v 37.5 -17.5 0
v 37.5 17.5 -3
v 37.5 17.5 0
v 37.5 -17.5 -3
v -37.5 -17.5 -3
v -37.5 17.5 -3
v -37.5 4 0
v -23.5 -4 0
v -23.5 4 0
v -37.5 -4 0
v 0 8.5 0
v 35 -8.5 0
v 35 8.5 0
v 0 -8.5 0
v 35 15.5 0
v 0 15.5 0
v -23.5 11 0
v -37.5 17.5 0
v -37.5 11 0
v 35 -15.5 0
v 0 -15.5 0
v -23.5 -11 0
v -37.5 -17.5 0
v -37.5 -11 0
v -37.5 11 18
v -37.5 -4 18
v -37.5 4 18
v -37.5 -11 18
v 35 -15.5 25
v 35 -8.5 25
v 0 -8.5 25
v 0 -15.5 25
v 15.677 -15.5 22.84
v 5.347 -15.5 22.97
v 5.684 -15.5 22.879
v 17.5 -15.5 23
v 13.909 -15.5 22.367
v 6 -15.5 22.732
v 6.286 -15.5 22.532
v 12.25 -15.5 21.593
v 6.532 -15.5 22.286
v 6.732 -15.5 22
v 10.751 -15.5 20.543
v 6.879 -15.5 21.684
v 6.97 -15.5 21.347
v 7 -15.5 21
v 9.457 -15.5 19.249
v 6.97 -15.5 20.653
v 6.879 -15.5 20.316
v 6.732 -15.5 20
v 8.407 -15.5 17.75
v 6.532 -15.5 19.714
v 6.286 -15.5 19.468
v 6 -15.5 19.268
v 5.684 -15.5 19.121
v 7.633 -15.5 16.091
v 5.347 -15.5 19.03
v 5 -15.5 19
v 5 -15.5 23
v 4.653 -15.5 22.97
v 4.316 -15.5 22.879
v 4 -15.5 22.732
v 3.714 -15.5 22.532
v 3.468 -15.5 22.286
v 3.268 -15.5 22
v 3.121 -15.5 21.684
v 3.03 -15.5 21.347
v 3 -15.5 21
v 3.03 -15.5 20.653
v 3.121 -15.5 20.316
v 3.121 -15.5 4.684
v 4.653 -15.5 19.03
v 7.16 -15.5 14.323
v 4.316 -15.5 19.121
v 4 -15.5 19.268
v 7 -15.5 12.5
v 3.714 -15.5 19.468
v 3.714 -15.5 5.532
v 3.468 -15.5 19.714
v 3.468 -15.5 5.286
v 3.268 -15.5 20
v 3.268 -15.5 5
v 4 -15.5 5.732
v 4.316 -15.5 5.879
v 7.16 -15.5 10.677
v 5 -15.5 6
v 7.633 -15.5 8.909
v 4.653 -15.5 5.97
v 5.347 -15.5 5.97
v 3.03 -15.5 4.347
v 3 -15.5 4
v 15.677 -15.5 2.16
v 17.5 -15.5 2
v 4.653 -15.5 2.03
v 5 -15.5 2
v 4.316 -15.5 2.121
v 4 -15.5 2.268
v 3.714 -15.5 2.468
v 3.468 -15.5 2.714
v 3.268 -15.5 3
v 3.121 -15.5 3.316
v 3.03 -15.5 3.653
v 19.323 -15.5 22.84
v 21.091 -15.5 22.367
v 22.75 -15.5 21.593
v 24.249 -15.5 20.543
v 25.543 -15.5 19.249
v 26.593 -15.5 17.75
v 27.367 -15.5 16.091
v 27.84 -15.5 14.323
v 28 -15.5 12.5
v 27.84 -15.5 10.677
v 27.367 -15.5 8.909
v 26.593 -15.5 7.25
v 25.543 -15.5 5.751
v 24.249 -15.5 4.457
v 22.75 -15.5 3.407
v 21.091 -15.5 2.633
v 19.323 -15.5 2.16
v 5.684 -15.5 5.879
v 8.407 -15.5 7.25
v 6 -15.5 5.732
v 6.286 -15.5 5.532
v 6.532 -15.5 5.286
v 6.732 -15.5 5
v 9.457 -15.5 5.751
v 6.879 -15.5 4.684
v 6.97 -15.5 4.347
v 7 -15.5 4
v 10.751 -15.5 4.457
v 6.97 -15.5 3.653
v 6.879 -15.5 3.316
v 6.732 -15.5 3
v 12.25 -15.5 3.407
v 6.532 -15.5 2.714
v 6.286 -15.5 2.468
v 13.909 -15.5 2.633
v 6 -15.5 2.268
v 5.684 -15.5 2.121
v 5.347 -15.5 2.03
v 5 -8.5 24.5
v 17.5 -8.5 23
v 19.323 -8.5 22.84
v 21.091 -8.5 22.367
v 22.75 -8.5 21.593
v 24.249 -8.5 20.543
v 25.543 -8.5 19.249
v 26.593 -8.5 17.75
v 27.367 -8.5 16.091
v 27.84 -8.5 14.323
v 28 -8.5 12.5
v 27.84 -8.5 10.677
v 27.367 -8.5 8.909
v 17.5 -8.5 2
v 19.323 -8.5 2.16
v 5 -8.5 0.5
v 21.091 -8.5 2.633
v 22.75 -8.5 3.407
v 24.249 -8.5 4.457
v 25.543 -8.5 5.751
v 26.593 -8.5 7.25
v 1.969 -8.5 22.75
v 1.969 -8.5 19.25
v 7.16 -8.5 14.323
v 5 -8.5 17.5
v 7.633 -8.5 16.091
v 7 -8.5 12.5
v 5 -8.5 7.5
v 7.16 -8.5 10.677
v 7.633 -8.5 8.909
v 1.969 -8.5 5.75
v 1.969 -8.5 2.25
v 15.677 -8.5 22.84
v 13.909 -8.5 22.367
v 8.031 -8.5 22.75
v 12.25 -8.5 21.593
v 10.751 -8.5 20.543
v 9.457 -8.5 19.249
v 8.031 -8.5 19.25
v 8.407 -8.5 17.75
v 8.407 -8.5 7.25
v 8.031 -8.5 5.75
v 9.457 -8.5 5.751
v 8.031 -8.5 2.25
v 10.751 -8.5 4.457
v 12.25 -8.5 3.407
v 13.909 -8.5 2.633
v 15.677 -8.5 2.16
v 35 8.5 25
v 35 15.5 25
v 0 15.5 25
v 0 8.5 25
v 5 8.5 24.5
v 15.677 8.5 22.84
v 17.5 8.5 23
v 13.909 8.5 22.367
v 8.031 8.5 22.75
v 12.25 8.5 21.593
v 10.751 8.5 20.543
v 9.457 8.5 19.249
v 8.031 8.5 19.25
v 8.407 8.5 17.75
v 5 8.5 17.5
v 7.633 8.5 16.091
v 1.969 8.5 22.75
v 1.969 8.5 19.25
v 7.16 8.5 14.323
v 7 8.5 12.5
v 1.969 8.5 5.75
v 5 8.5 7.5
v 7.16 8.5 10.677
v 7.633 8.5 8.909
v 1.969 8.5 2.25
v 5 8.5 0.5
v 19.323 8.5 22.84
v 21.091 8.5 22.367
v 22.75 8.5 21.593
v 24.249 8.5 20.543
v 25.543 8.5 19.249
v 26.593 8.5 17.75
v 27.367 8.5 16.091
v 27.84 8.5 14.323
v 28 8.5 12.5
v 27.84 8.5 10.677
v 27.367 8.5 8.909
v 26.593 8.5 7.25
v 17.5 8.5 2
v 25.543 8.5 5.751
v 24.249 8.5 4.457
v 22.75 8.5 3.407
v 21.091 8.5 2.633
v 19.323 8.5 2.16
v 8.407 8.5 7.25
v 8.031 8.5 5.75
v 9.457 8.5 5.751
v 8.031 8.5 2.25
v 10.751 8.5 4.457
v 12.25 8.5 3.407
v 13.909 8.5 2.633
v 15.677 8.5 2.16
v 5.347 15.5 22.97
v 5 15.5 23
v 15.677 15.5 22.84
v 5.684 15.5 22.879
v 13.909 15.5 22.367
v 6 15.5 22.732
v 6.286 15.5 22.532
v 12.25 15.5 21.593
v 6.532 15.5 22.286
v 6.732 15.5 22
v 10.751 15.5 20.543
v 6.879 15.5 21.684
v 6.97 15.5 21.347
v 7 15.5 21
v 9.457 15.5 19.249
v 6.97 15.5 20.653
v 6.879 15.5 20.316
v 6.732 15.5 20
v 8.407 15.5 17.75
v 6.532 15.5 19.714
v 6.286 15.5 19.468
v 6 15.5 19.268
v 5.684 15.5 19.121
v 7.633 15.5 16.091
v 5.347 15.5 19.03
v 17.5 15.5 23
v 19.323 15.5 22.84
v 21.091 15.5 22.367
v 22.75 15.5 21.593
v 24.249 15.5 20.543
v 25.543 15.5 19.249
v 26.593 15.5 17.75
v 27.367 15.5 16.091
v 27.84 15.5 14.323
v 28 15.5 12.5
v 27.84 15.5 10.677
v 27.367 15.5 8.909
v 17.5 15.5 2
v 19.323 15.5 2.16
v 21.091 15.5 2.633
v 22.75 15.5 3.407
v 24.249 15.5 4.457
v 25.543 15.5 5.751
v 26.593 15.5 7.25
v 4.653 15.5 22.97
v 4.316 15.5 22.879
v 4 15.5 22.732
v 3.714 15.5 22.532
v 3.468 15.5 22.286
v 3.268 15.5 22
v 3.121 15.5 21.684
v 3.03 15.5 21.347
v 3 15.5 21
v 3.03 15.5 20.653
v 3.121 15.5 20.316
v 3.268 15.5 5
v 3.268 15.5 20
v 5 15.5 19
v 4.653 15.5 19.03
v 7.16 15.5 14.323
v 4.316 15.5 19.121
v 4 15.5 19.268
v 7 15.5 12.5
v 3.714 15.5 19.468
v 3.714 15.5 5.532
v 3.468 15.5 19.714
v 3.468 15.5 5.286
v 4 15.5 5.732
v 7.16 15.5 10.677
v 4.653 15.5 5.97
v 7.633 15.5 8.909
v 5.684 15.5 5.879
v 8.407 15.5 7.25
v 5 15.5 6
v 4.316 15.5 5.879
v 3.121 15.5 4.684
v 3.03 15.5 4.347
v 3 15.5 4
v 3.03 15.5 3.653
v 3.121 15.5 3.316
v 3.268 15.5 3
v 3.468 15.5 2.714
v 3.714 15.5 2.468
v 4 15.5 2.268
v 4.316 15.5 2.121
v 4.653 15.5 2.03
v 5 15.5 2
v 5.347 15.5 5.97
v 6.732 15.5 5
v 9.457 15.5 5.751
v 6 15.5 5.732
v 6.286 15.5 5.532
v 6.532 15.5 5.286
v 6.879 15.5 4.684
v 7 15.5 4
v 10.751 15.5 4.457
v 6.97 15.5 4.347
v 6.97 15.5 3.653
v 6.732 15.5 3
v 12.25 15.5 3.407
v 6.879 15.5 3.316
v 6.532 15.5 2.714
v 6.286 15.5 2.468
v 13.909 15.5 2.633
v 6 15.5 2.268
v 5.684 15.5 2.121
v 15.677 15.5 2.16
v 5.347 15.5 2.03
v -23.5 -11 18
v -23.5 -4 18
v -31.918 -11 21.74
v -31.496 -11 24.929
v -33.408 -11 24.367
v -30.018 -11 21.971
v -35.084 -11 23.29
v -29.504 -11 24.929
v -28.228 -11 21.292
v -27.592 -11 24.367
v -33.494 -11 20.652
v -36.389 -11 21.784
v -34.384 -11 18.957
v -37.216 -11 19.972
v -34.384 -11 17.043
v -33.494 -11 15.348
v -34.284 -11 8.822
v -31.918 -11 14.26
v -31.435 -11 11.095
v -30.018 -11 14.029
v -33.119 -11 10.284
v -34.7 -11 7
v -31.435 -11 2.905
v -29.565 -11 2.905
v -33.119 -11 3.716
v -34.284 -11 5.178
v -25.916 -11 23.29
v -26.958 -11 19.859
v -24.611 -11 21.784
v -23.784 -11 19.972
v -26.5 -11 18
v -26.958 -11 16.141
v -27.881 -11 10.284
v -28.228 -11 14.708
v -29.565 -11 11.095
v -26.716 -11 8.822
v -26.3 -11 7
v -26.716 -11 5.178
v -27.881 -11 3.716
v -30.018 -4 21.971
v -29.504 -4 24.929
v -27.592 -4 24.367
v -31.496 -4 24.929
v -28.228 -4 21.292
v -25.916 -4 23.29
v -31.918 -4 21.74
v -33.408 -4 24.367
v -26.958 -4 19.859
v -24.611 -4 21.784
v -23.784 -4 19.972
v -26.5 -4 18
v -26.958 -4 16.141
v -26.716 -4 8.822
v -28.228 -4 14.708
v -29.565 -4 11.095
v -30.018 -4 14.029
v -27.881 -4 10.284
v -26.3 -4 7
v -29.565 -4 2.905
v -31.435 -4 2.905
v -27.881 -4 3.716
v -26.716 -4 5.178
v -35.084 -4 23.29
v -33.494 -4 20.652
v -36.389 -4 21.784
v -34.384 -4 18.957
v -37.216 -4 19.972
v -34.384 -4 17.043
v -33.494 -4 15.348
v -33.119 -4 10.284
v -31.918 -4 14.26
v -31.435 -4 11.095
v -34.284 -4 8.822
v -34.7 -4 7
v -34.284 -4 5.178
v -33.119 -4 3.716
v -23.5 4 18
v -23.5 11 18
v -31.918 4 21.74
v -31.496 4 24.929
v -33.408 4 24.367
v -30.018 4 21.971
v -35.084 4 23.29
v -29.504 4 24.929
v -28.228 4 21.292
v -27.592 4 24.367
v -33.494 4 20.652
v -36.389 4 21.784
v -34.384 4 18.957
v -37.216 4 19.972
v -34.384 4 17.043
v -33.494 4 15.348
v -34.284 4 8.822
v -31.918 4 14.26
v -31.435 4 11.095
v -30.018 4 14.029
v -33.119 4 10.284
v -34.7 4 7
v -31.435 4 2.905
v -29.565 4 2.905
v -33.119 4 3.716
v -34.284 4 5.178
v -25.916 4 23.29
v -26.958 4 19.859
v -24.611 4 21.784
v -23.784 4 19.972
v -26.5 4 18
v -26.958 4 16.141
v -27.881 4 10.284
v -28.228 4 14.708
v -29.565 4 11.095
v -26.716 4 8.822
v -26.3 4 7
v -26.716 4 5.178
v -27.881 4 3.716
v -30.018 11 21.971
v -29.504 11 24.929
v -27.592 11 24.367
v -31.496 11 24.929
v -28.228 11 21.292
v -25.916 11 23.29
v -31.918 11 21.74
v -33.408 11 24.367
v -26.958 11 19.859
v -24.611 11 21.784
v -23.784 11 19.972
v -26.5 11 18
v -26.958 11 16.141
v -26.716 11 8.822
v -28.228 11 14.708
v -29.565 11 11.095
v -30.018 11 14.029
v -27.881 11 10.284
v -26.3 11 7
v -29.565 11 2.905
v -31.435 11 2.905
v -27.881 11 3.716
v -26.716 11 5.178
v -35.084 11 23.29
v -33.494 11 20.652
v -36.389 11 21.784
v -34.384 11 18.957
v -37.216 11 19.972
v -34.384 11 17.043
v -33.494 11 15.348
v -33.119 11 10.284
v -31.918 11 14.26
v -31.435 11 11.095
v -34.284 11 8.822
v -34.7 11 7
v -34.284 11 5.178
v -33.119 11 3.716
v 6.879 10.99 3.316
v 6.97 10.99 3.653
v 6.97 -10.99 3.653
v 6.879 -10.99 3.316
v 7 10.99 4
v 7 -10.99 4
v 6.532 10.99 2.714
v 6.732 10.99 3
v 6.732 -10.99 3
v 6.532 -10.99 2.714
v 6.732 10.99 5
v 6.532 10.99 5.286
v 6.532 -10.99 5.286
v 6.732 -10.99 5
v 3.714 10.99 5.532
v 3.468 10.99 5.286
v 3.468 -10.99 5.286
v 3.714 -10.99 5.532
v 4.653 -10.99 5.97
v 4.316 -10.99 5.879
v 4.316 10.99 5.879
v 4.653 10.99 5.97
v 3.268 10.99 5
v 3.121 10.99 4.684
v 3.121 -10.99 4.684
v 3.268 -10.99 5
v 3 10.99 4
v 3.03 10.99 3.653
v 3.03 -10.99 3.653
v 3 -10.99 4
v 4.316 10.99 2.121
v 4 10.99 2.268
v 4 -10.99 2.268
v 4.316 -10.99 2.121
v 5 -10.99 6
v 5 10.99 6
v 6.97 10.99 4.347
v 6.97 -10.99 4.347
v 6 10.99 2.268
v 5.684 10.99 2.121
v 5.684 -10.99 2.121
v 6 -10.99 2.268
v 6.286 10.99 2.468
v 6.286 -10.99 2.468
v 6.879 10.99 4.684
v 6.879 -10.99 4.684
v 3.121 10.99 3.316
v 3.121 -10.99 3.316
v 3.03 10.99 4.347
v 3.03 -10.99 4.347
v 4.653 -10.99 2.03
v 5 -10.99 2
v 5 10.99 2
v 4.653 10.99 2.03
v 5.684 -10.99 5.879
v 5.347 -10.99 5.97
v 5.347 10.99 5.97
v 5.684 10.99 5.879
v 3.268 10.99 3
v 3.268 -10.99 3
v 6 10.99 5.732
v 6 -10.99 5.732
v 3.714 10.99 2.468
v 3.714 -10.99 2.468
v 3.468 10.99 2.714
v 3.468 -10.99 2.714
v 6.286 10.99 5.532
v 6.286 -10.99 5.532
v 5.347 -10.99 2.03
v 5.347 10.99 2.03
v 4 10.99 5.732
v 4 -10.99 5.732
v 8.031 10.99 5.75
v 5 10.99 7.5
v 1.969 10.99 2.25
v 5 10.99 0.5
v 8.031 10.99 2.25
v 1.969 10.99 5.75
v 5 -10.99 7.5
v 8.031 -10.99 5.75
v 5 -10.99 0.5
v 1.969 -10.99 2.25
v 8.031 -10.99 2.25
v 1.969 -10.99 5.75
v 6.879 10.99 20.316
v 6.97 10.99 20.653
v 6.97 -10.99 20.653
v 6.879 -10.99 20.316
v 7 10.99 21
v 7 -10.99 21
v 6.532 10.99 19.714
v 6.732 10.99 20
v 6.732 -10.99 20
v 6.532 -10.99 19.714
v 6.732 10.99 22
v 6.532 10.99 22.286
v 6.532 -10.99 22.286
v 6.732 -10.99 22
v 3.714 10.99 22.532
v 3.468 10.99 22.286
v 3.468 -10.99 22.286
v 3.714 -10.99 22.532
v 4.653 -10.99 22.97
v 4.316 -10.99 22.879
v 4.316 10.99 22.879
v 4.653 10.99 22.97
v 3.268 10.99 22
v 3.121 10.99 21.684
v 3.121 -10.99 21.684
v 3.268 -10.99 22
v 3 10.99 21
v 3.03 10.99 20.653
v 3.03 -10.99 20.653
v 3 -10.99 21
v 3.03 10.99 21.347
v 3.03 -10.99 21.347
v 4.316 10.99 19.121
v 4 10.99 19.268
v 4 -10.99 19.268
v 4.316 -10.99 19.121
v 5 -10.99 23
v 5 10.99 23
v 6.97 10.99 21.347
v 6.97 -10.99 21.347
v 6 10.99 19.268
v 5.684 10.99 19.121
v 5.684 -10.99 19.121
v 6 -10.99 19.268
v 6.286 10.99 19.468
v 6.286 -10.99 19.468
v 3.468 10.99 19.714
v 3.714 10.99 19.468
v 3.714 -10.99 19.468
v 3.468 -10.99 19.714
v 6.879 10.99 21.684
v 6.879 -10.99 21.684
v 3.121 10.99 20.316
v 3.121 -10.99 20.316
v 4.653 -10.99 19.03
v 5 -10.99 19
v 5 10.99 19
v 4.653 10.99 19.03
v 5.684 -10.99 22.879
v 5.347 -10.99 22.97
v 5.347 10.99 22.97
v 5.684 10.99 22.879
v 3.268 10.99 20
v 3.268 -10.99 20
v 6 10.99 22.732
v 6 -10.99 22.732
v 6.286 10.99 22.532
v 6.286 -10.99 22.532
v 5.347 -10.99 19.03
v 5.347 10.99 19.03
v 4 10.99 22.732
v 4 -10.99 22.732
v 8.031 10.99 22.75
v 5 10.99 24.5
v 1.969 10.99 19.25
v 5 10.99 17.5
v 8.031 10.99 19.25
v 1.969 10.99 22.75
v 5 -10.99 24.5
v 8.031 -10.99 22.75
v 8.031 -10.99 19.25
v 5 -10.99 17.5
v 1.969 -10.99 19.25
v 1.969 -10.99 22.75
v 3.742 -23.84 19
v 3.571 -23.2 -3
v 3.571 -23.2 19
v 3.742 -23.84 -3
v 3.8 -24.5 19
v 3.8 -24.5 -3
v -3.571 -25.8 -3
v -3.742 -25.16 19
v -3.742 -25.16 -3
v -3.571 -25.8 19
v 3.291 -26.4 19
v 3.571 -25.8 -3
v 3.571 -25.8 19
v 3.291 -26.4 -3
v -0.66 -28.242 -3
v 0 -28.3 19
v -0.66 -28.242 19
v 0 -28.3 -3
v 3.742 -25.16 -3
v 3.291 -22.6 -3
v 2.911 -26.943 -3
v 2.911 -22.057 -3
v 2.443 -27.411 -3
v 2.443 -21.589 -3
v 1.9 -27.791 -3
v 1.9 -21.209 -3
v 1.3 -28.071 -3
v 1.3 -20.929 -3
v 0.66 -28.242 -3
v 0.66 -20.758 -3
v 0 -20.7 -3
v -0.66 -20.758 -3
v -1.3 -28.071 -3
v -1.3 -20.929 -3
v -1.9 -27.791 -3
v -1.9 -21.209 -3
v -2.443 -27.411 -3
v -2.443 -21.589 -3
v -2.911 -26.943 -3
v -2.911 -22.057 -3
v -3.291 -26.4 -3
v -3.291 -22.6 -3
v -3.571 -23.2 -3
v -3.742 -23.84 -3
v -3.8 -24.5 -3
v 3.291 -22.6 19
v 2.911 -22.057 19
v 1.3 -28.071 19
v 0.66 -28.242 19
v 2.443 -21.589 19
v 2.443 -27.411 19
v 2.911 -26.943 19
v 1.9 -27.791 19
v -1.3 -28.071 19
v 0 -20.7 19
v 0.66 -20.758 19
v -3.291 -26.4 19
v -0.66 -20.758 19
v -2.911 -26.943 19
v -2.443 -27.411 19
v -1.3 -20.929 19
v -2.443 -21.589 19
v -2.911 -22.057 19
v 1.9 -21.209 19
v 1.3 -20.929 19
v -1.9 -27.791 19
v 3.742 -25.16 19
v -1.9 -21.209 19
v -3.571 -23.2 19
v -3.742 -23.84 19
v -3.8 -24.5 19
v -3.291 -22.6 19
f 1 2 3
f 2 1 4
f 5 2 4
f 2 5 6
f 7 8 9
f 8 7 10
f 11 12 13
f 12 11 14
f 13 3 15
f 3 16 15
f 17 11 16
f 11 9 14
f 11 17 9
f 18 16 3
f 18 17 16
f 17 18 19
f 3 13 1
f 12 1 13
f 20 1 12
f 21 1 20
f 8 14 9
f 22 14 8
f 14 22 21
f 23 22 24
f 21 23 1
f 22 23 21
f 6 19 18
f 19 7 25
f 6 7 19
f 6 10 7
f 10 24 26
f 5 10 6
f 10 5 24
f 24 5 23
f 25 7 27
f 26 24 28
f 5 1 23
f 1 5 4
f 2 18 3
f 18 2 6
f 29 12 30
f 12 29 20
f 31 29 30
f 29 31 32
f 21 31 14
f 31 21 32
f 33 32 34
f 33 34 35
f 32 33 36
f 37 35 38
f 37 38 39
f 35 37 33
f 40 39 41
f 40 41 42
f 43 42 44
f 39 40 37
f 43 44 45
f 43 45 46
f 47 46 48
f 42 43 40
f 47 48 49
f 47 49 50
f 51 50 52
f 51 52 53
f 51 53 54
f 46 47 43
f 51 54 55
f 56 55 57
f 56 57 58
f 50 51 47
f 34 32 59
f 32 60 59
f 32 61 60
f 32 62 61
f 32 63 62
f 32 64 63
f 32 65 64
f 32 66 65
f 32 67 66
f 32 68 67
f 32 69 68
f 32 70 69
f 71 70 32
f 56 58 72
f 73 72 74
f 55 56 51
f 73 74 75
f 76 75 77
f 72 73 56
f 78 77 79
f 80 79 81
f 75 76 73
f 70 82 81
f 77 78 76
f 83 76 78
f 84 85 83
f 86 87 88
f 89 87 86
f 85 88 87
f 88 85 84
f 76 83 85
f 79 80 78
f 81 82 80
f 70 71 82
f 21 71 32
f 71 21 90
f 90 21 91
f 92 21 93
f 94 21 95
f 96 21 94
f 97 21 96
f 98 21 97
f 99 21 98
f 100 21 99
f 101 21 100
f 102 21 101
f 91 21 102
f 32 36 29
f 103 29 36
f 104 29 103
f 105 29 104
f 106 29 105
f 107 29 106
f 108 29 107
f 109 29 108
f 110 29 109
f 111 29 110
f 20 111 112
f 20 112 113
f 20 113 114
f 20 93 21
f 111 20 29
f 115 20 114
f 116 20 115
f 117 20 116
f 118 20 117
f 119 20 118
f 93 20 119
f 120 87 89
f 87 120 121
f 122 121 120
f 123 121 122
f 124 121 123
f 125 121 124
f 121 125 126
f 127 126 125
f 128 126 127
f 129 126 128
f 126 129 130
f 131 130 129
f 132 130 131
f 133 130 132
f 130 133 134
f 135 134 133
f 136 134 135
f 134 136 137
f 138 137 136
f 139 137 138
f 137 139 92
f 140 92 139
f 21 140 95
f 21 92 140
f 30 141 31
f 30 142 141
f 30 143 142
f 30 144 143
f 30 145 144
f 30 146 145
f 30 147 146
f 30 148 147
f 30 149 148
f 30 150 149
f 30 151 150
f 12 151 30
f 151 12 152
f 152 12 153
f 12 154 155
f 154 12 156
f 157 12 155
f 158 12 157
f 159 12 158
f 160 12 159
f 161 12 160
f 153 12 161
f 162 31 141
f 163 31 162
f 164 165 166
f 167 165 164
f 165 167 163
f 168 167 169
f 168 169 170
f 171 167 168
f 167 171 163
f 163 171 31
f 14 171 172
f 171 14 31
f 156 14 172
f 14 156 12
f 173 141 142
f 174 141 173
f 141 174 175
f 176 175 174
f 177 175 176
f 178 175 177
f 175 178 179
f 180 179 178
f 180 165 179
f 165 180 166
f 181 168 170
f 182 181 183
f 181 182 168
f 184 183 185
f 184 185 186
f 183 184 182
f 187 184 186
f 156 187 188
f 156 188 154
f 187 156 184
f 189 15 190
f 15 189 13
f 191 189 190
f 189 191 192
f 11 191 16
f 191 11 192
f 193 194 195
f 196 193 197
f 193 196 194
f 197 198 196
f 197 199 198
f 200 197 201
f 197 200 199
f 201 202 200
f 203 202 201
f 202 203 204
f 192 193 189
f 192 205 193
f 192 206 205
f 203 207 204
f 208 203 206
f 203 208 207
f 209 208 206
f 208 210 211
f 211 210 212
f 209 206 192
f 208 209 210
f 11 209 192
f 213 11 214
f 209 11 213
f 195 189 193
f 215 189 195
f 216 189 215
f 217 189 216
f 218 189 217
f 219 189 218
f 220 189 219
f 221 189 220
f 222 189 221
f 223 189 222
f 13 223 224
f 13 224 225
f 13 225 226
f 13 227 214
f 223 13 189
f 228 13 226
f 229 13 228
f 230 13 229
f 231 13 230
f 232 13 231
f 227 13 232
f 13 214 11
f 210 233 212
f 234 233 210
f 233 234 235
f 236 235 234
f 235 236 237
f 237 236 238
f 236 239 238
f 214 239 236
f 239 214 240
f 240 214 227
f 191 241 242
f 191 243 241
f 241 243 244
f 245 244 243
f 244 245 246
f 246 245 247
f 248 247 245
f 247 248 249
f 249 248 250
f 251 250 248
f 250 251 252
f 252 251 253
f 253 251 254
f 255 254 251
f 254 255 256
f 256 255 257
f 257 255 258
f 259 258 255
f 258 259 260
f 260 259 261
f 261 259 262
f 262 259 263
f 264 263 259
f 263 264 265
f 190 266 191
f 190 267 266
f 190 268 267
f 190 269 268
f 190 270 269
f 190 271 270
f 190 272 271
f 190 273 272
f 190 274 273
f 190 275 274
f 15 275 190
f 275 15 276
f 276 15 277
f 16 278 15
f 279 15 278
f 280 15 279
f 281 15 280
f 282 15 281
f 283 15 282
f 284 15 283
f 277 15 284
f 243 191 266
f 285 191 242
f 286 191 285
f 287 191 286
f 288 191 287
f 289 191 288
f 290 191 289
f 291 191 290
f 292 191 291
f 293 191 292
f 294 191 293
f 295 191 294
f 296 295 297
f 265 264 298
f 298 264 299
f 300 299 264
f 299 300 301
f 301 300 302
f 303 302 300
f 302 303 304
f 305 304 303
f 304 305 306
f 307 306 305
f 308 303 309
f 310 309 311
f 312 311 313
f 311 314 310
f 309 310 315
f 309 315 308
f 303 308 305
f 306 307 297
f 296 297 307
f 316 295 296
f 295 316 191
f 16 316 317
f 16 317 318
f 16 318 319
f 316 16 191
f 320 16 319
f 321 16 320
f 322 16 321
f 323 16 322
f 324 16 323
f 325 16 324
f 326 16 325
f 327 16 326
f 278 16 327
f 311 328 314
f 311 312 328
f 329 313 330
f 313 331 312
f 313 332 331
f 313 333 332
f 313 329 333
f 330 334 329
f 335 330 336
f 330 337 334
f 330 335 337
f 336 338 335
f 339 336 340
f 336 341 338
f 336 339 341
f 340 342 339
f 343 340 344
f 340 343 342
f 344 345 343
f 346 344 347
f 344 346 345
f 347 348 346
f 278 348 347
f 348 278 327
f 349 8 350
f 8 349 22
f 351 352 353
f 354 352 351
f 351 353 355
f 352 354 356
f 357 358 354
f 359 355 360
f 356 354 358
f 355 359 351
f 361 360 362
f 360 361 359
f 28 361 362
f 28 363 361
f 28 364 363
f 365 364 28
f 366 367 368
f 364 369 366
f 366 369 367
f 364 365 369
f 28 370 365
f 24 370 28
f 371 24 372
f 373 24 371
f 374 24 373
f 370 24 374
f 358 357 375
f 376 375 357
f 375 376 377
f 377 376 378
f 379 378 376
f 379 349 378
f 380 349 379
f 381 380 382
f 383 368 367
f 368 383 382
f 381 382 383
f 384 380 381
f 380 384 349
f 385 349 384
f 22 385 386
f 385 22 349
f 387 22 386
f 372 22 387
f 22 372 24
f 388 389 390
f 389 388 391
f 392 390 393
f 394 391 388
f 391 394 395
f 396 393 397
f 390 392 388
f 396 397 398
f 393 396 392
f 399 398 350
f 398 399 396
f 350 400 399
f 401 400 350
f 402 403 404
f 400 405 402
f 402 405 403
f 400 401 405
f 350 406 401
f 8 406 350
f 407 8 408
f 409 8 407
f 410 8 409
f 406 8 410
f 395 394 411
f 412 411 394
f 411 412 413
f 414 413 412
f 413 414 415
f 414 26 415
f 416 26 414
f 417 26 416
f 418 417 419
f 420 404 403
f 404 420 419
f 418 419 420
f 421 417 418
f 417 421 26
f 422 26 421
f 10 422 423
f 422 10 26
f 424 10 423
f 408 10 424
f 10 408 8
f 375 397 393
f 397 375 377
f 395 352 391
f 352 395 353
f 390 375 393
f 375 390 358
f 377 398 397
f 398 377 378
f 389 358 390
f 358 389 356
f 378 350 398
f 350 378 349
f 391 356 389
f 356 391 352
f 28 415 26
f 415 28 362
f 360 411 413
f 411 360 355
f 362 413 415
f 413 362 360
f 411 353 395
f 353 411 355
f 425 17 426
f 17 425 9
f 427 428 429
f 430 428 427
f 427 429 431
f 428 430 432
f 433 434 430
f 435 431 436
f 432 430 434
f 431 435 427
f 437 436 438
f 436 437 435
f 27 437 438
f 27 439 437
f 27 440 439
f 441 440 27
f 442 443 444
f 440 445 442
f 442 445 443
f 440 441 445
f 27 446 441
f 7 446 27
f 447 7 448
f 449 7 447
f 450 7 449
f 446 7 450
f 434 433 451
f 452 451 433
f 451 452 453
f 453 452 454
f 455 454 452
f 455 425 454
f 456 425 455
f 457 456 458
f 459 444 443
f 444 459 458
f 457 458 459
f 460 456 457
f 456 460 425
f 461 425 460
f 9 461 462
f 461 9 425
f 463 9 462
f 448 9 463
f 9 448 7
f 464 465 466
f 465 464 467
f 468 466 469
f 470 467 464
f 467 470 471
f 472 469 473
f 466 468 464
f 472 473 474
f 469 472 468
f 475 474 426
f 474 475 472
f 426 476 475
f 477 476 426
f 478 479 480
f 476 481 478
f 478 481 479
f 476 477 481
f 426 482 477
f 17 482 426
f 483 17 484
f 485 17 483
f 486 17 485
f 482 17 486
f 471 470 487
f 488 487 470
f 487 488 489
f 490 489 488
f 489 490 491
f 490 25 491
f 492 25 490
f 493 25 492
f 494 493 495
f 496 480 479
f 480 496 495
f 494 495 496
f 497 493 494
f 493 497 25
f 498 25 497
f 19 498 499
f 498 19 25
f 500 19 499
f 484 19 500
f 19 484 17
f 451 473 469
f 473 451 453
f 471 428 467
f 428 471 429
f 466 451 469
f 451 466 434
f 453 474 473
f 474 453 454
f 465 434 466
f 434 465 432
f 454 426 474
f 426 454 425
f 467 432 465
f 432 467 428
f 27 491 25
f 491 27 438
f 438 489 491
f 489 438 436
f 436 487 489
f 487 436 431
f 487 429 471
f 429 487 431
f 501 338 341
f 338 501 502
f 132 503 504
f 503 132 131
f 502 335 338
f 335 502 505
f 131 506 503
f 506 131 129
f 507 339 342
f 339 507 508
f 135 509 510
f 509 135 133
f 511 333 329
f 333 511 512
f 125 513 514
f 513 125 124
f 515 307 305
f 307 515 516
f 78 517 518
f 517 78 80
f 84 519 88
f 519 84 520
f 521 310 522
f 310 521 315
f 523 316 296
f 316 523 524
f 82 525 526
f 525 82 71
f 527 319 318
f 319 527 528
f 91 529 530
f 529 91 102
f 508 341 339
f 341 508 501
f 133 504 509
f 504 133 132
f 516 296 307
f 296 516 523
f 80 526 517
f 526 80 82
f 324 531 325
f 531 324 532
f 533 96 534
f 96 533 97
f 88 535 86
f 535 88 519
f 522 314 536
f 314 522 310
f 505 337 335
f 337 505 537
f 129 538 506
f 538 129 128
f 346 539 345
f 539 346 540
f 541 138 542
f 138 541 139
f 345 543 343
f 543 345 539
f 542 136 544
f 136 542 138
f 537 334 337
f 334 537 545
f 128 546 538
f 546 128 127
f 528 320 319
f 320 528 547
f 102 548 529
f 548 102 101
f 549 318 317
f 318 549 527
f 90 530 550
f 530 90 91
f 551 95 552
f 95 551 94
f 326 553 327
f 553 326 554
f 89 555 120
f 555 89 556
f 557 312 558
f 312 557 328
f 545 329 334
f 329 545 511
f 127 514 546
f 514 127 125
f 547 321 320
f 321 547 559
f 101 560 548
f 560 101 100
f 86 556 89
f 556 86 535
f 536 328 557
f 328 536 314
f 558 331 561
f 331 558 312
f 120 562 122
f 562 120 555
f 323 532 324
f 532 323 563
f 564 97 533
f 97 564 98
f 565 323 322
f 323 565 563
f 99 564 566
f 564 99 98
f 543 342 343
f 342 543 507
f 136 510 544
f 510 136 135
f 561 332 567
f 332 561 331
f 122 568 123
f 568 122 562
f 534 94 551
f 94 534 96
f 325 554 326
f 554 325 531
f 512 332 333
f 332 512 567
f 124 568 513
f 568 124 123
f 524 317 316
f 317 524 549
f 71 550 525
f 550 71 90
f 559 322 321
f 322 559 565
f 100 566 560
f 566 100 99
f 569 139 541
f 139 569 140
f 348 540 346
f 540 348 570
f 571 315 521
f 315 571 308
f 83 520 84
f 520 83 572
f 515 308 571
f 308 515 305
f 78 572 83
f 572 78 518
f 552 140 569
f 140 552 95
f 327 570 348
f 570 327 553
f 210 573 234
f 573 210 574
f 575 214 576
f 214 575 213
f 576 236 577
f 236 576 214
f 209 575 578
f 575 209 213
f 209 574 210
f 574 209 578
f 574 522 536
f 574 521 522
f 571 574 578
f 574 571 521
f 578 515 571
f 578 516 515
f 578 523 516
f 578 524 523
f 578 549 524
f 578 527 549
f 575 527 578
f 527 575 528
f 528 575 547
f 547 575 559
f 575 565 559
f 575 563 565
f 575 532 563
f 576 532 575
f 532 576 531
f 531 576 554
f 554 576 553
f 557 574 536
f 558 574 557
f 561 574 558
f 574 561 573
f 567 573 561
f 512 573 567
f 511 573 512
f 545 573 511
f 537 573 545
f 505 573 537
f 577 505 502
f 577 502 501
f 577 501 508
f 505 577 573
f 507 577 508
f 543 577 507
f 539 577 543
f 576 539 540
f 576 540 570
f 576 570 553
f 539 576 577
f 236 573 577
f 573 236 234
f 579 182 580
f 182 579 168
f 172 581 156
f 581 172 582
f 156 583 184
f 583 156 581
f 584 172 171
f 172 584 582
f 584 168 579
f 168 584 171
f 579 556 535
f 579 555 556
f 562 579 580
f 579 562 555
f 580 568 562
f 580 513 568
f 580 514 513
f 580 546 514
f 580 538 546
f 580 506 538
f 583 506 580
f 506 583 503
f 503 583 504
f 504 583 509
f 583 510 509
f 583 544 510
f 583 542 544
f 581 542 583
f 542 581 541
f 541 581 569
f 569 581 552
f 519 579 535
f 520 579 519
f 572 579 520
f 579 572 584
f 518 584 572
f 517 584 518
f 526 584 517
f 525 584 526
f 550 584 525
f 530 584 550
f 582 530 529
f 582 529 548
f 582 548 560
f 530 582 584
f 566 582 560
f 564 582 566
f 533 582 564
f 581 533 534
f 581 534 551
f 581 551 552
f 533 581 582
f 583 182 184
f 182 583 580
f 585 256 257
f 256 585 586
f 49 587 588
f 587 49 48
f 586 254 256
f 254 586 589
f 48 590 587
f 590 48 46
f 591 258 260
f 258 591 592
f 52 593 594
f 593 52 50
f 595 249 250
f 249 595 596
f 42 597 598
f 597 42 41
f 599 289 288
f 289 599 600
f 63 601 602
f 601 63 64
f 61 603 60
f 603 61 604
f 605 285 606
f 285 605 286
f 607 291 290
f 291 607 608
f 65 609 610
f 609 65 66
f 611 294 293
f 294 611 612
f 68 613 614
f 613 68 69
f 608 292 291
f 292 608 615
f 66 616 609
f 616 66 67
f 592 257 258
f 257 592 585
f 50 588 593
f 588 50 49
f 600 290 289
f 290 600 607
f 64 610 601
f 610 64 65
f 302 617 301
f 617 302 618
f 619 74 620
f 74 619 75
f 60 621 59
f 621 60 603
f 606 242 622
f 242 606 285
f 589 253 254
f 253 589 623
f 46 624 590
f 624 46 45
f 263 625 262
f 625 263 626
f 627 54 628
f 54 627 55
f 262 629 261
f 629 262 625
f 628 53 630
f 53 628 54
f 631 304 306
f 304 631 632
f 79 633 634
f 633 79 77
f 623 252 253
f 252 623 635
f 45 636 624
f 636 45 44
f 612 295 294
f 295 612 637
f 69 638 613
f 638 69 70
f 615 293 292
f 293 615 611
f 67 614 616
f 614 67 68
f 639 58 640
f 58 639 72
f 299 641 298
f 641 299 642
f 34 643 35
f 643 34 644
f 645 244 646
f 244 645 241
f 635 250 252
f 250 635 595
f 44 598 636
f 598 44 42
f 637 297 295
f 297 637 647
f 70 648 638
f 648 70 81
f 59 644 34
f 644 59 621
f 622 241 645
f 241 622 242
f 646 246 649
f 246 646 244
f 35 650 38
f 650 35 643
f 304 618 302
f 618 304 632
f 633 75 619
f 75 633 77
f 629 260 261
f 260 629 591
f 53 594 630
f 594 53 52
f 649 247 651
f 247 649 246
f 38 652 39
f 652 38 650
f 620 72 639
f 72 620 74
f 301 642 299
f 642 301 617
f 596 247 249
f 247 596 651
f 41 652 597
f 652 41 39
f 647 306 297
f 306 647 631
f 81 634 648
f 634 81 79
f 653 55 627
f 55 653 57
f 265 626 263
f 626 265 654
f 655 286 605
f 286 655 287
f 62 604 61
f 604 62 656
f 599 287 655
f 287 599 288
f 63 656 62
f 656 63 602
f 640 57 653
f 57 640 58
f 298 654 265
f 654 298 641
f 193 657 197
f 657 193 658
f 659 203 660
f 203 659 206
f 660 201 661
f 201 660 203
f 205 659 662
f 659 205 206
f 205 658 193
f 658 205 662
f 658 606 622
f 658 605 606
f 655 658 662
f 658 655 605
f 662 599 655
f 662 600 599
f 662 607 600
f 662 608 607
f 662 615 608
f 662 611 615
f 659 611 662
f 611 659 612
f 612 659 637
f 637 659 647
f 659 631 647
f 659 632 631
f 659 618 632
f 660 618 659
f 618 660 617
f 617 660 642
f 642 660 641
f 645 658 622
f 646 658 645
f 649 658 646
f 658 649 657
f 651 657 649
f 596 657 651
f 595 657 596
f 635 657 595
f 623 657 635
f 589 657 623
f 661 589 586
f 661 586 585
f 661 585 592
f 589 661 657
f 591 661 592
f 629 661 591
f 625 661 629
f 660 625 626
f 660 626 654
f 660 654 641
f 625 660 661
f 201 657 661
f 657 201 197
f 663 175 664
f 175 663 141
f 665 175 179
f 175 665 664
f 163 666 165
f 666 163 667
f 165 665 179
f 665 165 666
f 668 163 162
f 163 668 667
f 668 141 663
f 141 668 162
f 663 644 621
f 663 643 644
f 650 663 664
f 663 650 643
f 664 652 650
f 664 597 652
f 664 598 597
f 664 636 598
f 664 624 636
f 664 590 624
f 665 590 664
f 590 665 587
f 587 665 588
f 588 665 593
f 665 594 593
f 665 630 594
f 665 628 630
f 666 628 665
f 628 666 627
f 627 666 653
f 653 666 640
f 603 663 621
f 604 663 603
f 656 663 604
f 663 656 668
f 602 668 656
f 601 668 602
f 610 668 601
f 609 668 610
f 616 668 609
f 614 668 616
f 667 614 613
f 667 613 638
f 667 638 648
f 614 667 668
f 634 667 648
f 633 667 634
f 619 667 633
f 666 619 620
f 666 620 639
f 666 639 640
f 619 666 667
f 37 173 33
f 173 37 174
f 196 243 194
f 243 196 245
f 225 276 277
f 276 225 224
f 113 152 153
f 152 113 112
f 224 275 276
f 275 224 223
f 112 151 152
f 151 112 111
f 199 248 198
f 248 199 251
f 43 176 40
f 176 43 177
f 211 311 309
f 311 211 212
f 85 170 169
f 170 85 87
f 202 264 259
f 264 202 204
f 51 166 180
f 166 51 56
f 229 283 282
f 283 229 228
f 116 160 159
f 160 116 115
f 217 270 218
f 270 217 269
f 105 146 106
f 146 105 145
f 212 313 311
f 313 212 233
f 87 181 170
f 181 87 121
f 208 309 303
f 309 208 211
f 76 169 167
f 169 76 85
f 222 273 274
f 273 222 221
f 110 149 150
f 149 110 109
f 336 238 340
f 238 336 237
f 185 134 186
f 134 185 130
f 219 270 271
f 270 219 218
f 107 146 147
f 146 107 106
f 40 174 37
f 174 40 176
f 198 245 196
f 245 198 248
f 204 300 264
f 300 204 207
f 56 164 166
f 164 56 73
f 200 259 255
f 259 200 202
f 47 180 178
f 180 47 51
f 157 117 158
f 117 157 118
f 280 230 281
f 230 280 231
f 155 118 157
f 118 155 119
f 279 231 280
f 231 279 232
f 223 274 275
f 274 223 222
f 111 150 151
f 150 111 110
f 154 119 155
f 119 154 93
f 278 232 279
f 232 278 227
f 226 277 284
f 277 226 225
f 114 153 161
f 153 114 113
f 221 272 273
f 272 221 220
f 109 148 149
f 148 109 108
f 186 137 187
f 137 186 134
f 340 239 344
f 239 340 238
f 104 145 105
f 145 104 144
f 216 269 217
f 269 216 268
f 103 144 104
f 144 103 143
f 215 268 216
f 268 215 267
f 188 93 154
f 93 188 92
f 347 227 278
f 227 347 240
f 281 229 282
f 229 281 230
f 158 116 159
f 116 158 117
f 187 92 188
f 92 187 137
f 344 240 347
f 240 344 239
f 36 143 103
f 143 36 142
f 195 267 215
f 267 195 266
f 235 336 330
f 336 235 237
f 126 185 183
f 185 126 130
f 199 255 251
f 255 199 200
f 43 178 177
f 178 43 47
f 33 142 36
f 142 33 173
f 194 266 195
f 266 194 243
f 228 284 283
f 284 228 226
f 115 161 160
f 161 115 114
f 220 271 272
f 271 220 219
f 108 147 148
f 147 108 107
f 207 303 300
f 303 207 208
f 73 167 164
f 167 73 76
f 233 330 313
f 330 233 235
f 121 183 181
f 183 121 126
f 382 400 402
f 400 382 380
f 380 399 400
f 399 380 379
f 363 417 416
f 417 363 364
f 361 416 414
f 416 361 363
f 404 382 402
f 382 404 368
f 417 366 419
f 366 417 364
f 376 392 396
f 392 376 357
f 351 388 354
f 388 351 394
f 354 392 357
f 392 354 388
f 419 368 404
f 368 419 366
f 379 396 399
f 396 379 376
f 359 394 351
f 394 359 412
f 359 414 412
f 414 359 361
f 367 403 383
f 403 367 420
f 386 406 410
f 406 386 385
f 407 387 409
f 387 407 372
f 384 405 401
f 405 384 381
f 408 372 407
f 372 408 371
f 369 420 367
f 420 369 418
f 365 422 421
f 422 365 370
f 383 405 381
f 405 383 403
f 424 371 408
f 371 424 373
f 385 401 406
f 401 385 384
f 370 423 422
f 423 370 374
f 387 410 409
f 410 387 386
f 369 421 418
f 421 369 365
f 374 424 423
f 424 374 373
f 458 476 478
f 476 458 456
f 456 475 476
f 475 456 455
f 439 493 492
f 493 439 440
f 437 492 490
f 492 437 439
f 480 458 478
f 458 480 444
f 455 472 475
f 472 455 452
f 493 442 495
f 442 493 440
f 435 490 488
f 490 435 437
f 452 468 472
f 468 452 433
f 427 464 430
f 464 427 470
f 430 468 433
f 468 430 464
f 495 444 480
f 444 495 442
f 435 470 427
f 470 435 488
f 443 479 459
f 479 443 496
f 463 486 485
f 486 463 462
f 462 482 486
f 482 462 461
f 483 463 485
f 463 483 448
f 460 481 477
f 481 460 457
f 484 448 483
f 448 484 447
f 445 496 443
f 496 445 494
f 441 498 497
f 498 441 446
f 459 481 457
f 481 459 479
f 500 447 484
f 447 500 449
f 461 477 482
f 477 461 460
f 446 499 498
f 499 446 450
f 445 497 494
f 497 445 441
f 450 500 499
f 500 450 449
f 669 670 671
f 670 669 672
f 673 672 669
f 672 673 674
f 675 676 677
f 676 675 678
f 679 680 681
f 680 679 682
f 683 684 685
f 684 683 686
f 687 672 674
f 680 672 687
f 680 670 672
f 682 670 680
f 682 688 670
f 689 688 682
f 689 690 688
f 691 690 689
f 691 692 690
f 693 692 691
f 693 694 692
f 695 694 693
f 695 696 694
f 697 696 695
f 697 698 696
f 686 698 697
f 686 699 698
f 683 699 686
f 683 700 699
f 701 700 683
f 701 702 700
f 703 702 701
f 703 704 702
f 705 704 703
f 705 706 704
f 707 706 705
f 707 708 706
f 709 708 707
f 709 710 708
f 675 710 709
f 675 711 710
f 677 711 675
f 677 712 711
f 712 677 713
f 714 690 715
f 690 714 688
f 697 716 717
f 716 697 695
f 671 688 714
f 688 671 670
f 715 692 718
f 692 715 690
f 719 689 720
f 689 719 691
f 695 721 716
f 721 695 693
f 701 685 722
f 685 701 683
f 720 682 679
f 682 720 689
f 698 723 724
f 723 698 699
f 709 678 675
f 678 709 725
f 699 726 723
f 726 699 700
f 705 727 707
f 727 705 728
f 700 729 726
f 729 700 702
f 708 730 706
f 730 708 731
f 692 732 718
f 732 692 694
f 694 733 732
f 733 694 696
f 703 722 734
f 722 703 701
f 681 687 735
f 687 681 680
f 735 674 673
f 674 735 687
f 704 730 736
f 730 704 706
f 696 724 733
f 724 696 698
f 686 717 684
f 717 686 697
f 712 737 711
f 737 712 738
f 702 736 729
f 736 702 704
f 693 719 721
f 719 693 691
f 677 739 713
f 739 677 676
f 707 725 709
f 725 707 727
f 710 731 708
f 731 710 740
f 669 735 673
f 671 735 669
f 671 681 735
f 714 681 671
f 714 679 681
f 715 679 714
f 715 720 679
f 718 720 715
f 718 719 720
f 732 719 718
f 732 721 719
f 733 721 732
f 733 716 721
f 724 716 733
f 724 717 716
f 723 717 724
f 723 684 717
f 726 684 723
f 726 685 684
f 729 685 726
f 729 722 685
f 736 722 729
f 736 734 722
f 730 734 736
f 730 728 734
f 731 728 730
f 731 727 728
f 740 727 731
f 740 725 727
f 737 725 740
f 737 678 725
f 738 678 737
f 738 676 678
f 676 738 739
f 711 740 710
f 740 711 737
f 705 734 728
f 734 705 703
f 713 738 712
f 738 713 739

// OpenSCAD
platform_length = 75;
platform_width = 35;
platform_thickness = 3;

frame_length = 35;
frame_heigth = 25;
frame_thickness = 7;
frame_spacing = 17;
frame_offset = 0;

front_skate_radius = 7;
front_skate_length = 25;

motor_holes_radius = 2;
motor_holes_spacing = 17;

offset = 1;
bearing_thickness = 8;
bearing_radius = 4;

// M3 nut 
nut_m3_radius = 3.5; //mm
nut_m3_thickness = 2.5; //mm

motor_offset = 5;

module frame()
{
	
}

module frame_base()
{
	union()
	{
		// Top Plate
		translate([platform_length/-2.0,platform_width/-2.0,0])
			cube([platform_length,platform_width,platform_thickness]);

		// Frame side 1
		translate([-1*frame_offset,frame_spacing/2,-1*frame_heigth])
			cube([frame_length,frame_thickness,frame_heigth]);

		// Frame side 2
		translate([-1*frame_offset,frame_spacing/-2-frame_thickness,-1*frame_heigth])
			cube([frame_length,frame_thickness,frame_heigth]);

		// Skate Leg
		translate([platform_length/-2,bearing_thickness/2,0-front_skate_length+front_skate_radius])
			cube([2*front_skate_radius,frame_thickness,front_skate_length-front_skate_radius]);

		// Skate
		translate([0-platform_length/2+front_skate_radius,bearing_thickness/2+frame_thickness,0-front_skate_length+front_skate_radius])
			rotate(a=90,v=[1,0,0])
				cylinder(r=front_skate_radius, h=frame_thickness);		

		// Skate Leg
		translate([platform_length/-2,bearing_thickness/-2-frame_thickness,0-front_skate_length+front_skate_radius])
			cube([2*front_skate_radius,frame_thickness,front_skate_length-front_skate_radius]);

		// Skate
		translate([0-platform_length/2+front_skate_radius,bearing_thickness/-2,0-front_skate_length+front_skate_radius])
			rotate(a=90,v=[1,0,0])
				cylinder(r=front_skate_radius, h=frame_thickness);			
	}
}

module bbbot()
{
difference()
{
	frame_base();

	// Frame Top Hole
	translate([-1*(frame_offset-motor_offset),(frame_spacing+(2*frame_thickness))/2+offset/2, (frame_heigth-motor_holes_spacing)/-2])
		rotate(a=90,v=[1,0,0])
			cylinder(r=motor_holes_radius, h=frame_spacing+(2*frame_thickness)+offset, $fn=36);

	translate([-1*(frame_offset-motor_offset),frame_spacing/-2+0.01, (frame_heigth-motor_holes_spacing)/-2])
		rotate(a=90,v=[1,0,0])
			rotate(a=30,v=[0,0,1])
				cylinder(r=nut_m3_radius, h=nut_m3_thickness, $fn=6);

	translate([-1*(frame_offset-motor_offset),frame_spacing/2+nut_m3_thickness-0.01, (frame_heigth-motor_holes_spacing)/-2])
		rotate(a=90,v=[1,0,0])
			rotate(a=30,v=[0,0,1])
				cylinder(r=nut_m3_radius, h=nut_m3_thickness, $fn=6);

	// Frame Bottom Hole
	translate([-1*(frame_offset-motor_offset),(frame_spacing+(2*frame_thickness))/2+offset/2, (frame_heigth-motor_holes_spacing)/-2-motor_holes_spacing])
		rotate(a=90,v=[1,0,0])
			cylinder(r=motor_holes_radius, h=frame_spacing+(2*frame_thickness)+offset, $fn=36);

	translate([-1*(frame_offset-motor_offset),frame_spacing/-2+0.01, (frame_heigth-motor_holes_spacing)/-2-motor_holes_spacing])
		rotate(a=90,v=[1,0,0])
			rotate(a=30,v=[0,0,1])
				cylinder(r=nut_m3_radius, h=nut_m3_thickness, $fn=6);

	translate([-1*(frame_offset-motor_offset),frame_spacing/2+nut_m3_thickness-0.01, (frame_heigth-motor_holes_spacing)/-2-motor_holes_spacing])
		rotate(a=90,v=[1,0,0])
			rotate(a=30,v=[0,0,1])
				cylinder(r=nut_m3_radius, h=nut_m3_thickness, $fn=6);

	// Frame big hole
	translate([frame_length/2-frame_offset,(frame_spacing+(2*frame_thickness))/2+offset/2,frame_heigth/-2])
		rotate(a=90,v=[1,0,0])
			cylinder(r=1.5*front_skate_radius, h=frame_spacing+(2*frame_thickness)+offset, $fn=36);

	// Skate hole
	translate([0-platform_length/2+front_skate_radius,bearing_thickness/2+frame_thickness+offset/2,0-front_skate_length+front_skate_radius])
		rotate(a=90,v=[1,0,0])
			cylinder(r=bearing_radius, h=frame_thickness+offset);

	// Skate Top hole
	translate([0-platform_length/2+front_skate_radius,bearing_thickness/2+frame_thickness+offset/2,0-front_skate_radius])
		rotate(a=90,v=[1,0,0])
			cylinder(r=0.6*front_skate_radius, h=frame_thickness+offset);

	// Skate hole
	translate([0-platform_length/2+front_skate_radius,bearing_thickness/-2+offset/2,0-front_skate_length+front_skate_radius])
		rotate(a=90,v=[1,0,0])
			cylinder(r=bearing_radius, h=frame_thickness+offset);

	// Skate Top hole
	translate([0-platform_length/2+front_skate_radius,bearing_thickness/-2+offset/2,0-front_skate_radius])
		rotate(a=90,v=[1,0,0])
			cylinder(r=0.6*front_skate_radius, h=frame_thickness+offset);

	// Top Side Holes
//	translate([0,1.25*platform_width,0])
//		cylinder(r=platform_width, h=platform_thickness);
//	translate([0,-1.25*platform_width,0])
//		cylinder(r=platform_width, h=platform_thickness);

}
}

rotate(a=180,v=[1,0,0])
union()
{
	translate([0,platform_width/2+bearing_radius+3,platform_thickness])
			rotate(a=180, v=[1,0,0])
				cylinder(r=0.95*bearing_radius,h=bearing_thickness+2*frame_thickness, $fn=36);

	bbbot();
}
